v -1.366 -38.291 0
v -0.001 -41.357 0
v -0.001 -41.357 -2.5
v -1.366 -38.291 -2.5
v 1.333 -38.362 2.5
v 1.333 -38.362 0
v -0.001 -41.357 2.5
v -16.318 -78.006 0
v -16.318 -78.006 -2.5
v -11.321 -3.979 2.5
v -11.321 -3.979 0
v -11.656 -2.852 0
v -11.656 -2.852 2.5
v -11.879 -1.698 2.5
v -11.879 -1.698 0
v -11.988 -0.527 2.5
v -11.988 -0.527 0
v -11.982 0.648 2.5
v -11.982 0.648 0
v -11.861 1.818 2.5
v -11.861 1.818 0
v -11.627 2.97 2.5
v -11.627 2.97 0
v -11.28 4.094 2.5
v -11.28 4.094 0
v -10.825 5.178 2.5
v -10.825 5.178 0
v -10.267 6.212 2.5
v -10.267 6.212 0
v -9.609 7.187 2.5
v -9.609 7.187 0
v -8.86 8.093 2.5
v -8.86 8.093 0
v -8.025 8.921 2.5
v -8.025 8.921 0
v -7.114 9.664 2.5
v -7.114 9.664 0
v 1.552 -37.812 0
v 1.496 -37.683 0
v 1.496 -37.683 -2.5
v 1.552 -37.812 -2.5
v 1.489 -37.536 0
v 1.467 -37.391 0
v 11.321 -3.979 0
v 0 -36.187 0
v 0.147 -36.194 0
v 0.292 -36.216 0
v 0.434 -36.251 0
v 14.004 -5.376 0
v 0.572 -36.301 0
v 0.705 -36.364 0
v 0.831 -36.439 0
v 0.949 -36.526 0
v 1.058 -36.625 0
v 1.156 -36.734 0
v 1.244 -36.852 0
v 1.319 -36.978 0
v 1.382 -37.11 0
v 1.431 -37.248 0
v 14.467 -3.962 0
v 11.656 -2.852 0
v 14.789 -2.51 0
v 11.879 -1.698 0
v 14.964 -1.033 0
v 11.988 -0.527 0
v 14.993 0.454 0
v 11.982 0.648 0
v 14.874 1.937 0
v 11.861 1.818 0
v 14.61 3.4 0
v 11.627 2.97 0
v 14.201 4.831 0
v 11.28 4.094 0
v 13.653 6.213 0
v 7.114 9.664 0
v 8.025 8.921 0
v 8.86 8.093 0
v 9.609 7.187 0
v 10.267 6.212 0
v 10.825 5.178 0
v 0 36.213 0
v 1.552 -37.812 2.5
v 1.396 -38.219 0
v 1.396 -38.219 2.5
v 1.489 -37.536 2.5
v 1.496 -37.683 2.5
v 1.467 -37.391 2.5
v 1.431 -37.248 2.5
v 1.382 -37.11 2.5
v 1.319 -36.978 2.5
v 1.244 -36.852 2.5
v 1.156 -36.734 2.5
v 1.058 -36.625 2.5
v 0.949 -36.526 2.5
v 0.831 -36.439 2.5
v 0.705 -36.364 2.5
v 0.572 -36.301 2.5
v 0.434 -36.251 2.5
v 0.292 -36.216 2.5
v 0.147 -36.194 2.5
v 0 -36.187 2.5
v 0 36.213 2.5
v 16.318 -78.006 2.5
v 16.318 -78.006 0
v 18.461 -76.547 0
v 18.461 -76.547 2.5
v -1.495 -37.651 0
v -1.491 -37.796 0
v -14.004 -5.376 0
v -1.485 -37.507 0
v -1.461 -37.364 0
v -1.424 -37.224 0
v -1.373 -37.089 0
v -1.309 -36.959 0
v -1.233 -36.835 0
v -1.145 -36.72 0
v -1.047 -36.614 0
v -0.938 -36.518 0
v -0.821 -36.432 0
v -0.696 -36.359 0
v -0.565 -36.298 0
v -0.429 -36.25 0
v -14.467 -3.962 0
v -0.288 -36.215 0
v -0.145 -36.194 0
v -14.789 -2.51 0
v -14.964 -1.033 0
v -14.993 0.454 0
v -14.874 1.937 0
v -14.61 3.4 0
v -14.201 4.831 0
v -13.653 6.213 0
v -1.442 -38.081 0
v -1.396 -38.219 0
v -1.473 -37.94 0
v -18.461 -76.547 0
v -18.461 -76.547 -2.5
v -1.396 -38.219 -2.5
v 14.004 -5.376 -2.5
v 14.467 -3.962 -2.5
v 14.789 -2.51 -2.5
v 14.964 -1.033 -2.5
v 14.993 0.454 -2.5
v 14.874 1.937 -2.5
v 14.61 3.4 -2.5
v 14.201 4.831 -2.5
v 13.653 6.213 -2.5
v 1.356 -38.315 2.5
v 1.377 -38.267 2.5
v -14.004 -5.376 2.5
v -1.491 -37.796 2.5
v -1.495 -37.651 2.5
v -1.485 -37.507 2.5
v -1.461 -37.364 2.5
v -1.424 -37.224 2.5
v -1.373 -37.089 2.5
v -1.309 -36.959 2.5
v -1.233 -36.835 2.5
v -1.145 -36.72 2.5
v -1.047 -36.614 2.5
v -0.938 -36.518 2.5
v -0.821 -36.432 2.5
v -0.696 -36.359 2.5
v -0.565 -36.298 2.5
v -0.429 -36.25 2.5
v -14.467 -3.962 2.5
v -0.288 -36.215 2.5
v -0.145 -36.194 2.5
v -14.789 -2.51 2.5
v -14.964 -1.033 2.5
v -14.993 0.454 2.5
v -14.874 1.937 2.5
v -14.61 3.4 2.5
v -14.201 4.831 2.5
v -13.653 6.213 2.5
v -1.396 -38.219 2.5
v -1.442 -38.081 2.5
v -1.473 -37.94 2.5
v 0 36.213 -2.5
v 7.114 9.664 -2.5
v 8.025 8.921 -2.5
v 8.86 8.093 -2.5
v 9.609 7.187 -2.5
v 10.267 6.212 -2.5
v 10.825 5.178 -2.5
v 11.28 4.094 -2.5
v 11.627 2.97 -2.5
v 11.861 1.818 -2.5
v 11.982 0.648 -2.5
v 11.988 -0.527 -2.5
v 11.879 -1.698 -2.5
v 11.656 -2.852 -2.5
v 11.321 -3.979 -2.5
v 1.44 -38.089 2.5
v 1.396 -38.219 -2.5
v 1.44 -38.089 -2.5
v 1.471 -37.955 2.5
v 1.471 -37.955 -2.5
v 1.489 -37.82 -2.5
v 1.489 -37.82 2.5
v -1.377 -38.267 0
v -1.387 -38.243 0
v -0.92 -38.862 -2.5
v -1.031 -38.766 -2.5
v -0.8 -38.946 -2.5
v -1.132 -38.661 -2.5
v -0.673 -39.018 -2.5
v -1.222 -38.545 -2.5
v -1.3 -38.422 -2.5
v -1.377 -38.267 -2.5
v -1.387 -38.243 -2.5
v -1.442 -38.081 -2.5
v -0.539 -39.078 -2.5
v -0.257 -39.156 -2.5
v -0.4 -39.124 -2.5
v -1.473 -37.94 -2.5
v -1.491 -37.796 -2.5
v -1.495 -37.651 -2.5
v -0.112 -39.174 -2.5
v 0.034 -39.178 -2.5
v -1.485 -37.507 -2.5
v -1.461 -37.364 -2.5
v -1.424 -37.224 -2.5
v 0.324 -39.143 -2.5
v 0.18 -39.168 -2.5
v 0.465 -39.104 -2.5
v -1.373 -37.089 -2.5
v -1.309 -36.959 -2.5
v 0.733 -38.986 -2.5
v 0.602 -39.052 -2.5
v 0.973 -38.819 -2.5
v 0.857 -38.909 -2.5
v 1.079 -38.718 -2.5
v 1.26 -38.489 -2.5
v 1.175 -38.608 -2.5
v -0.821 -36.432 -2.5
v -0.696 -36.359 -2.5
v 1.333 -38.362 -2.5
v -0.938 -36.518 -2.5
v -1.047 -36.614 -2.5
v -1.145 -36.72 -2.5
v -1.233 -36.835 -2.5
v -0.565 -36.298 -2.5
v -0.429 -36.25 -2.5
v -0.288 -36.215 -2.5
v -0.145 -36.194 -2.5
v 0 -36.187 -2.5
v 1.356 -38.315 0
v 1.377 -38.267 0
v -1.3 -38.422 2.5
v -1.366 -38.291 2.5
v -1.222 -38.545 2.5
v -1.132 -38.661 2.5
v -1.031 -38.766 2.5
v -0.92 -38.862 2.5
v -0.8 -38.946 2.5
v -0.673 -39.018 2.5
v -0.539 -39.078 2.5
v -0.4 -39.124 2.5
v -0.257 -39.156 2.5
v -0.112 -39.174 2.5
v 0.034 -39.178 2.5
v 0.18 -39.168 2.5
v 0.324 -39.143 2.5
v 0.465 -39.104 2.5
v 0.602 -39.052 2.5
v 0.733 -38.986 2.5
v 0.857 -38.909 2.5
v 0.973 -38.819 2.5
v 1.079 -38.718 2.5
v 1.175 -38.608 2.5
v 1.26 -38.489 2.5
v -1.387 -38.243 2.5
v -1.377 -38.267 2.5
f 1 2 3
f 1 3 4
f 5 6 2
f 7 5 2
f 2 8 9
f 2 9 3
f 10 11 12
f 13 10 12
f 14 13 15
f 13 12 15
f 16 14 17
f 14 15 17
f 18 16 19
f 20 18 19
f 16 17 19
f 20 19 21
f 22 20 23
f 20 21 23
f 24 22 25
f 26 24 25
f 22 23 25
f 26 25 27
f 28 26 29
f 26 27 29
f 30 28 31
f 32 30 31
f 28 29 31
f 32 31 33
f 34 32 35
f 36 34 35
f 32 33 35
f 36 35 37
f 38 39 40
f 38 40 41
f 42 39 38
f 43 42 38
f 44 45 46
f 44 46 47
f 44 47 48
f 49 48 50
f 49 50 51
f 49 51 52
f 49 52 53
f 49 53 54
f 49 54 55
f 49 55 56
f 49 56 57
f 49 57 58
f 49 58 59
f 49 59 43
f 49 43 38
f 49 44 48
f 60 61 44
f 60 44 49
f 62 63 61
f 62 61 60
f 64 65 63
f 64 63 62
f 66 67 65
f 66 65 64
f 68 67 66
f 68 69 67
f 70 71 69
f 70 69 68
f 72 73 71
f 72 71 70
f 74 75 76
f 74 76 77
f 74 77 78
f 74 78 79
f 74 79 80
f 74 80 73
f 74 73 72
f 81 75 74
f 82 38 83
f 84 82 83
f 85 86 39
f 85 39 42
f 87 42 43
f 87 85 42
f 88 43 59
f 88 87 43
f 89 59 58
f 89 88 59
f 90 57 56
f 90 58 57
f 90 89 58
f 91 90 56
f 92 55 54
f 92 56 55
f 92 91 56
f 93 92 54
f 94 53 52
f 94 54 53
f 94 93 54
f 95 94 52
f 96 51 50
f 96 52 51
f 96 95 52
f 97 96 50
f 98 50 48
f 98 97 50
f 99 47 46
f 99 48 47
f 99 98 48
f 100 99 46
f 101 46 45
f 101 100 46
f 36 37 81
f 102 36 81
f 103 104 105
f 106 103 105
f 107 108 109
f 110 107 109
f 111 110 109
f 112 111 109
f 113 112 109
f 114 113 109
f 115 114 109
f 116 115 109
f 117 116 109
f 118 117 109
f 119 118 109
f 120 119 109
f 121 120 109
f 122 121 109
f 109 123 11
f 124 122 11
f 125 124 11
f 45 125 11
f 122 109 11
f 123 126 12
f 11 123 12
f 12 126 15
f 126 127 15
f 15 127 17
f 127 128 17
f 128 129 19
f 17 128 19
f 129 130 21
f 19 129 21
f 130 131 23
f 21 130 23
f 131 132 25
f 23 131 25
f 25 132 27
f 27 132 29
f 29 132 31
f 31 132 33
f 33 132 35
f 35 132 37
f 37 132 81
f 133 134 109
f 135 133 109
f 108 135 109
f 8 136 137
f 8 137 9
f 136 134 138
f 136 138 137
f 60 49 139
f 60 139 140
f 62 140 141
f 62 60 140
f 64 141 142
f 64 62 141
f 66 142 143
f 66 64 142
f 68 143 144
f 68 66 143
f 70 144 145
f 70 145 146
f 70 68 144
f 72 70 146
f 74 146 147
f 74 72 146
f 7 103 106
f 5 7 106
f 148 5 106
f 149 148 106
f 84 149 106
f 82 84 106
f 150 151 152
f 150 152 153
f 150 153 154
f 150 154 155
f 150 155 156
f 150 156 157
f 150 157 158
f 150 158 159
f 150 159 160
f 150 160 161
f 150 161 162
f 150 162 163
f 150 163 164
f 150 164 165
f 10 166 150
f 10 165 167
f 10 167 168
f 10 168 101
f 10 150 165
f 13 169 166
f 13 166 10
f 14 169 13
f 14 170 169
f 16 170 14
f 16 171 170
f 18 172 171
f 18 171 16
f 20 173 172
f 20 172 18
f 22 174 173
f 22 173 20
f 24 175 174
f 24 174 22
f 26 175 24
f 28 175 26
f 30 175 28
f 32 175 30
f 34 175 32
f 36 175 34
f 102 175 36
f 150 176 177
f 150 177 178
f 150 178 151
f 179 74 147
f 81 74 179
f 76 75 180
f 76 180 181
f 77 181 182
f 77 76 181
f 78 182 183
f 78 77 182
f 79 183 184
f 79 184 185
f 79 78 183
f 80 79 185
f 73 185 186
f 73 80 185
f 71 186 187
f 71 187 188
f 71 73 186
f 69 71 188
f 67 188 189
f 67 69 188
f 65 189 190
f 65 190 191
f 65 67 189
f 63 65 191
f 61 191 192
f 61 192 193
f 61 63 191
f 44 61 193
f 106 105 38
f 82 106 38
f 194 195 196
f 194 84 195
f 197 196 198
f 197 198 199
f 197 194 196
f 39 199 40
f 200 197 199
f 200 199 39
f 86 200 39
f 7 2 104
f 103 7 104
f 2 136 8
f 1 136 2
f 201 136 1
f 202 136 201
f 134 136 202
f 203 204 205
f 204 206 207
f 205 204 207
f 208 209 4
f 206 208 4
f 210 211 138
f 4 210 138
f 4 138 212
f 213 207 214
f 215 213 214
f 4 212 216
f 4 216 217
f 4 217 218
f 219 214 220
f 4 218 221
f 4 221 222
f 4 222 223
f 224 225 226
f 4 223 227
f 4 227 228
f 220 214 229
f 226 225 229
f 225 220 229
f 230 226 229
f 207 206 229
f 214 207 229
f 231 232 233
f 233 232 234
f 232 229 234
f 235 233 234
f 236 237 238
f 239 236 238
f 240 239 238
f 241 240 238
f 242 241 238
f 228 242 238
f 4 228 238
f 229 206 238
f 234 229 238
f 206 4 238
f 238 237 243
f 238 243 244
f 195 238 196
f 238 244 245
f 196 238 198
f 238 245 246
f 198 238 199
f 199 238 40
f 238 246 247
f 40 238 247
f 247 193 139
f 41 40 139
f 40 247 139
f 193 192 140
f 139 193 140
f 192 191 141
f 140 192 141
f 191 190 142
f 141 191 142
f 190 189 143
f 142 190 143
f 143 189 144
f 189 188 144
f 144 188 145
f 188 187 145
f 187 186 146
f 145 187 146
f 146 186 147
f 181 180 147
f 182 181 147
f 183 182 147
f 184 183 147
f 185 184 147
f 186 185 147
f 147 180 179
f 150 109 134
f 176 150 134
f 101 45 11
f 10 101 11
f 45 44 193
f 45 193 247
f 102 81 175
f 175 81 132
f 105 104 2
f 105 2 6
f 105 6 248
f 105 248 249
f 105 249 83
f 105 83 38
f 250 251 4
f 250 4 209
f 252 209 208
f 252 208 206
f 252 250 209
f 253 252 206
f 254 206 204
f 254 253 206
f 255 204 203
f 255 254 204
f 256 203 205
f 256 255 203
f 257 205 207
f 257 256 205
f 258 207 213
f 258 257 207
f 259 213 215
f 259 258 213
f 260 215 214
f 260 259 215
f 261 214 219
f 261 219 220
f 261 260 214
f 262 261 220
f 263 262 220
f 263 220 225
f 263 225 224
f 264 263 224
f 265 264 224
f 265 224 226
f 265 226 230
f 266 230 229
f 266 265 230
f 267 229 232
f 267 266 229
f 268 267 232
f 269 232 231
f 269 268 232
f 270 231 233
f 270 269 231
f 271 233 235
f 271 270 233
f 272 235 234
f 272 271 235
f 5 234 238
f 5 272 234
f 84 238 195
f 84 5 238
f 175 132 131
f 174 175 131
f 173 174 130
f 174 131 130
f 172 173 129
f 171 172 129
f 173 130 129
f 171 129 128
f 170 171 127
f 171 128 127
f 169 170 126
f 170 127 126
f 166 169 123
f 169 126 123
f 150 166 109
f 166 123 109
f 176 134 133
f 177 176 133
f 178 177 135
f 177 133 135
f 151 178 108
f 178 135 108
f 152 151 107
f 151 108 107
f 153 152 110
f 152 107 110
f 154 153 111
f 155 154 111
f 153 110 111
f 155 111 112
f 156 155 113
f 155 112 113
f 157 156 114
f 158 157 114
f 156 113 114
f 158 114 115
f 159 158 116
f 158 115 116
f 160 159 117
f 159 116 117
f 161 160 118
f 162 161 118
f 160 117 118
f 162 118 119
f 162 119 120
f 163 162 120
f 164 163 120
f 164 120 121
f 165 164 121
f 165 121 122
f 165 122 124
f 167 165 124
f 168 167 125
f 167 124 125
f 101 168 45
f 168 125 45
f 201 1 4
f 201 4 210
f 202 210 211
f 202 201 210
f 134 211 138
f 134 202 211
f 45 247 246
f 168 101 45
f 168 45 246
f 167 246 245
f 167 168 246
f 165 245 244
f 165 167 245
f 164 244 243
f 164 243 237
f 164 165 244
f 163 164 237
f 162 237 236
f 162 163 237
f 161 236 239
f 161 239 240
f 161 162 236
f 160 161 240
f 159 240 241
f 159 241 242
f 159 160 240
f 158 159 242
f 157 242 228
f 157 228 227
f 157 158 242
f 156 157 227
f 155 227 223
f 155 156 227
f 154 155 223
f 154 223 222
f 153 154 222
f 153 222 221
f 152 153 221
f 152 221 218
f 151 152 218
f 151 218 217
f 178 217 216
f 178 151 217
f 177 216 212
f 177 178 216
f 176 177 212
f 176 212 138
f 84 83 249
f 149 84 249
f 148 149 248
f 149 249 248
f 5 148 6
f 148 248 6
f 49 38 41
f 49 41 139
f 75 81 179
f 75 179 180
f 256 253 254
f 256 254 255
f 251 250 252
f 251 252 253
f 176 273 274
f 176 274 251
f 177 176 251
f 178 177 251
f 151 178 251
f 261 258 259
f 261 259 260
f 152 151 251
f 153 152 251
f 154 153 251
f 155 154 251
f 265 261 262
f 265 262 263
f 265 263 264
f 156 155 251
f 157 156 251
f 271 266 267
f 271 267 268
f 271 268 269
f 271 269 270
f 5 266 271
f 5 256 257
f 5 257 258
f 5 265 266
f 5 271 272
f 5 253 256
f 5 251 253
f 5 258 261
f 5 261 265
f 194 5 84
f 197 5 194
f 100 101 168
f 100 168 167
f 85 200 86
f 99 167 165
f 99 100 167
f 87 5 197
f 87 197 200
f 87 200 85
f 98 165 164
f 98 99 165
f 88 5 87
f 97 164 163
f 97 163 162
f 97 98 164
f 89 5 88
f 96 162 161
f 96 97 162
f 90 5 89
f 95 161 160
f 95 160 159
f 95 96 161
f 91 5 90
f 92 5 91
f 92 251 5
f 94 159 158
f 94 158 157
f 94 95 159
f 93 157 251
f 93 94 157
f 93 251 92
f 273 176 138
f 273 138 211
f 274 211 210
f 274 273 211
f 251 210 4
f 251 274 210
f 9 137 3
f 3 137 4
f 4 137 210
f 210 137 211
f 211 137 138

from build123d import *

# Parameters (mm, degrees)
BOSS_EXTRUDE30_DEPTH = 2.5
BOSS_EXTRUDE31_DEPTH = 2.5
BOSS_EXTRUDE34_DEPTH = 2.5
BOSS_EXTRUDE39_DEPTH = 2.5
BOSS_EXTRUDE40_DEPTH = 2.5


with BuildPart() as part:
    # Sketch1 → Boss-Extrude30 (new, symmetric)
    with BuildSketch(Plane.XY):
        with BuildLine():
            ThreePointArc((1.495748311, -37.682643513), (1.057653773, -36.62498974), (0, -36.186895202))
            ThreePointArc((0, -36.186895202), (-1.232685354, -36.835442341), (-1.396401346, -38.218671768))
            ThreePointArc((-1.396401346, -38.218671768), (-1.381877755, -38.25507419), (-1.366405387, -38.291083589))
            ThreePointArc((-1.366405387, -38.291083589), (-0.039118875, -39.177880191), (1.332721503, -38.361699036))
            Line((1.332721503, -38.361699036), (1.396401346, -38.218671768))
            ThreePointArc((1.396401346, -38.218671768), (1.470701867, -37.955221993), (1.495748311, -37.682643513))
        make_face()
    extrude(amount=BOSS_EXTRUDE30_DEPTH, both=True)

    # Sketch1<9> → Boss-Extrude31 (add)
    with BuildSketch(Plane.XY):
        with BuildLine():
            Line((13.652695817, 6.213203436), (0, 36.213203436))
            Line((0, 36.213203436), (7.113830396, 9.664026961))
            ThreePointArc((7.113830396, 9.664026961), (11.4671721, 3.536094459), (11.320991311, -3.979341118))
            Line((11.320991311, -3.979341118), (0, -36.186895202))
            ThreePointArc((0, -36.186895202), (1.057653773, -36.62498974), (1.495748311, -37.682643513))
            Line((1.495748311, -37.682643513), (1.55237162, -37.812355314))
            Line((1.55237162, -37.812355314), (14.003706397, -5.375519243))
            ThreePointArc((14.003706397, -5.375519243), (14.993124064, 0.454126423), (13.652695817, 6.213203436))
        make_face()
    extrude(amount=-BOSS_EXTRUDE31_DEPTH)


with BuildPart() as body_2:
    # Sketch1<11> → Boss-Extrude34 (new body)
    with BuildSketch(Plane.XY):
        with BuildLine():
            Line((-7.113830396, 9.664026961), (0, 36.213203436))
            Line((0, 36.213203436), (-13.652695817, 6.213203436))
            ThreePointArc((-13.652695817, 6.213203436), (-14.993124064, 0.454126423), (-14.003706397, -5.375519243))
            Line((-14.003706397, -5.375519243), (-1.396401346, -38.218671768))
            ThreePointArc((-1.396401346, -38.218671768), (-1.232685354, -36.835442341), (0, -36.186895202))
            Line((0, -36.186895202), (-11.320991311, -3.979341118))
            ThreePointArc((-11.320991311, -3.979341118), (-11.4671721, 3.536094459), (-7.113830396, 9.664026961))
        make_face()
    extrude(amount=BOSS_EXTRUDE34_DEPTH)


with BuildPart() as body_3:
    # Sketch1<15> → Boss-Extrude39 (new body)
    with BuildSketch(Plane.XY):
        with BuildLine():
            Line((18.461180216, -76.546792649), (1.55237162, -37.812355314))
            Line((1.55237162, -37.812355314), (1.396401346, -38.218671768))
            ThreePointArc((1.396401346, -38.218671768), (1.366434075, -38.29101916), (1.332721503, -38.361699036))
            Line((1.332721503, -38.361699036), (-0.001035308, -41.357365883))
            Line((-0.001035308, -41.357365883), (16.317854893, -78.005542703))
            Line((16.317854893, -78.005542703), (18.461180216, -76.546792649))
        make_face()
    extrude(amount=BOSS_EXTRUDE39_DEPTH)


with BuildPart() as body_4:
    # Sketch1<16> → Boss-Extrude40 (new body)
    with BuildSketch(Plane.XY):
        with BuildLine():
            ThreePointArc((-1.366405387, -38.291083589), (-1.381877755, -38.25507419), (-1.396401346, -38.218671768))
            Line((-1.396401346, -38.218671768), (-18.461180216, -76.546792649))
            Line((-18.461180216, -76.546792649), (-16.317854893, -78.005542703))
            Line((-16.317854893, -78.005542703), (-0.001035308, -41.357365883))
            Line((-0.001035308, -41.357365883), (-1.366405387, -38.291083589))
        make_face()
    extrude(amount=-BOSS_EXTRUDE40_DEPTH)


solid = Compound([part.part, body_2.part, body_3.part, body_4.part])
